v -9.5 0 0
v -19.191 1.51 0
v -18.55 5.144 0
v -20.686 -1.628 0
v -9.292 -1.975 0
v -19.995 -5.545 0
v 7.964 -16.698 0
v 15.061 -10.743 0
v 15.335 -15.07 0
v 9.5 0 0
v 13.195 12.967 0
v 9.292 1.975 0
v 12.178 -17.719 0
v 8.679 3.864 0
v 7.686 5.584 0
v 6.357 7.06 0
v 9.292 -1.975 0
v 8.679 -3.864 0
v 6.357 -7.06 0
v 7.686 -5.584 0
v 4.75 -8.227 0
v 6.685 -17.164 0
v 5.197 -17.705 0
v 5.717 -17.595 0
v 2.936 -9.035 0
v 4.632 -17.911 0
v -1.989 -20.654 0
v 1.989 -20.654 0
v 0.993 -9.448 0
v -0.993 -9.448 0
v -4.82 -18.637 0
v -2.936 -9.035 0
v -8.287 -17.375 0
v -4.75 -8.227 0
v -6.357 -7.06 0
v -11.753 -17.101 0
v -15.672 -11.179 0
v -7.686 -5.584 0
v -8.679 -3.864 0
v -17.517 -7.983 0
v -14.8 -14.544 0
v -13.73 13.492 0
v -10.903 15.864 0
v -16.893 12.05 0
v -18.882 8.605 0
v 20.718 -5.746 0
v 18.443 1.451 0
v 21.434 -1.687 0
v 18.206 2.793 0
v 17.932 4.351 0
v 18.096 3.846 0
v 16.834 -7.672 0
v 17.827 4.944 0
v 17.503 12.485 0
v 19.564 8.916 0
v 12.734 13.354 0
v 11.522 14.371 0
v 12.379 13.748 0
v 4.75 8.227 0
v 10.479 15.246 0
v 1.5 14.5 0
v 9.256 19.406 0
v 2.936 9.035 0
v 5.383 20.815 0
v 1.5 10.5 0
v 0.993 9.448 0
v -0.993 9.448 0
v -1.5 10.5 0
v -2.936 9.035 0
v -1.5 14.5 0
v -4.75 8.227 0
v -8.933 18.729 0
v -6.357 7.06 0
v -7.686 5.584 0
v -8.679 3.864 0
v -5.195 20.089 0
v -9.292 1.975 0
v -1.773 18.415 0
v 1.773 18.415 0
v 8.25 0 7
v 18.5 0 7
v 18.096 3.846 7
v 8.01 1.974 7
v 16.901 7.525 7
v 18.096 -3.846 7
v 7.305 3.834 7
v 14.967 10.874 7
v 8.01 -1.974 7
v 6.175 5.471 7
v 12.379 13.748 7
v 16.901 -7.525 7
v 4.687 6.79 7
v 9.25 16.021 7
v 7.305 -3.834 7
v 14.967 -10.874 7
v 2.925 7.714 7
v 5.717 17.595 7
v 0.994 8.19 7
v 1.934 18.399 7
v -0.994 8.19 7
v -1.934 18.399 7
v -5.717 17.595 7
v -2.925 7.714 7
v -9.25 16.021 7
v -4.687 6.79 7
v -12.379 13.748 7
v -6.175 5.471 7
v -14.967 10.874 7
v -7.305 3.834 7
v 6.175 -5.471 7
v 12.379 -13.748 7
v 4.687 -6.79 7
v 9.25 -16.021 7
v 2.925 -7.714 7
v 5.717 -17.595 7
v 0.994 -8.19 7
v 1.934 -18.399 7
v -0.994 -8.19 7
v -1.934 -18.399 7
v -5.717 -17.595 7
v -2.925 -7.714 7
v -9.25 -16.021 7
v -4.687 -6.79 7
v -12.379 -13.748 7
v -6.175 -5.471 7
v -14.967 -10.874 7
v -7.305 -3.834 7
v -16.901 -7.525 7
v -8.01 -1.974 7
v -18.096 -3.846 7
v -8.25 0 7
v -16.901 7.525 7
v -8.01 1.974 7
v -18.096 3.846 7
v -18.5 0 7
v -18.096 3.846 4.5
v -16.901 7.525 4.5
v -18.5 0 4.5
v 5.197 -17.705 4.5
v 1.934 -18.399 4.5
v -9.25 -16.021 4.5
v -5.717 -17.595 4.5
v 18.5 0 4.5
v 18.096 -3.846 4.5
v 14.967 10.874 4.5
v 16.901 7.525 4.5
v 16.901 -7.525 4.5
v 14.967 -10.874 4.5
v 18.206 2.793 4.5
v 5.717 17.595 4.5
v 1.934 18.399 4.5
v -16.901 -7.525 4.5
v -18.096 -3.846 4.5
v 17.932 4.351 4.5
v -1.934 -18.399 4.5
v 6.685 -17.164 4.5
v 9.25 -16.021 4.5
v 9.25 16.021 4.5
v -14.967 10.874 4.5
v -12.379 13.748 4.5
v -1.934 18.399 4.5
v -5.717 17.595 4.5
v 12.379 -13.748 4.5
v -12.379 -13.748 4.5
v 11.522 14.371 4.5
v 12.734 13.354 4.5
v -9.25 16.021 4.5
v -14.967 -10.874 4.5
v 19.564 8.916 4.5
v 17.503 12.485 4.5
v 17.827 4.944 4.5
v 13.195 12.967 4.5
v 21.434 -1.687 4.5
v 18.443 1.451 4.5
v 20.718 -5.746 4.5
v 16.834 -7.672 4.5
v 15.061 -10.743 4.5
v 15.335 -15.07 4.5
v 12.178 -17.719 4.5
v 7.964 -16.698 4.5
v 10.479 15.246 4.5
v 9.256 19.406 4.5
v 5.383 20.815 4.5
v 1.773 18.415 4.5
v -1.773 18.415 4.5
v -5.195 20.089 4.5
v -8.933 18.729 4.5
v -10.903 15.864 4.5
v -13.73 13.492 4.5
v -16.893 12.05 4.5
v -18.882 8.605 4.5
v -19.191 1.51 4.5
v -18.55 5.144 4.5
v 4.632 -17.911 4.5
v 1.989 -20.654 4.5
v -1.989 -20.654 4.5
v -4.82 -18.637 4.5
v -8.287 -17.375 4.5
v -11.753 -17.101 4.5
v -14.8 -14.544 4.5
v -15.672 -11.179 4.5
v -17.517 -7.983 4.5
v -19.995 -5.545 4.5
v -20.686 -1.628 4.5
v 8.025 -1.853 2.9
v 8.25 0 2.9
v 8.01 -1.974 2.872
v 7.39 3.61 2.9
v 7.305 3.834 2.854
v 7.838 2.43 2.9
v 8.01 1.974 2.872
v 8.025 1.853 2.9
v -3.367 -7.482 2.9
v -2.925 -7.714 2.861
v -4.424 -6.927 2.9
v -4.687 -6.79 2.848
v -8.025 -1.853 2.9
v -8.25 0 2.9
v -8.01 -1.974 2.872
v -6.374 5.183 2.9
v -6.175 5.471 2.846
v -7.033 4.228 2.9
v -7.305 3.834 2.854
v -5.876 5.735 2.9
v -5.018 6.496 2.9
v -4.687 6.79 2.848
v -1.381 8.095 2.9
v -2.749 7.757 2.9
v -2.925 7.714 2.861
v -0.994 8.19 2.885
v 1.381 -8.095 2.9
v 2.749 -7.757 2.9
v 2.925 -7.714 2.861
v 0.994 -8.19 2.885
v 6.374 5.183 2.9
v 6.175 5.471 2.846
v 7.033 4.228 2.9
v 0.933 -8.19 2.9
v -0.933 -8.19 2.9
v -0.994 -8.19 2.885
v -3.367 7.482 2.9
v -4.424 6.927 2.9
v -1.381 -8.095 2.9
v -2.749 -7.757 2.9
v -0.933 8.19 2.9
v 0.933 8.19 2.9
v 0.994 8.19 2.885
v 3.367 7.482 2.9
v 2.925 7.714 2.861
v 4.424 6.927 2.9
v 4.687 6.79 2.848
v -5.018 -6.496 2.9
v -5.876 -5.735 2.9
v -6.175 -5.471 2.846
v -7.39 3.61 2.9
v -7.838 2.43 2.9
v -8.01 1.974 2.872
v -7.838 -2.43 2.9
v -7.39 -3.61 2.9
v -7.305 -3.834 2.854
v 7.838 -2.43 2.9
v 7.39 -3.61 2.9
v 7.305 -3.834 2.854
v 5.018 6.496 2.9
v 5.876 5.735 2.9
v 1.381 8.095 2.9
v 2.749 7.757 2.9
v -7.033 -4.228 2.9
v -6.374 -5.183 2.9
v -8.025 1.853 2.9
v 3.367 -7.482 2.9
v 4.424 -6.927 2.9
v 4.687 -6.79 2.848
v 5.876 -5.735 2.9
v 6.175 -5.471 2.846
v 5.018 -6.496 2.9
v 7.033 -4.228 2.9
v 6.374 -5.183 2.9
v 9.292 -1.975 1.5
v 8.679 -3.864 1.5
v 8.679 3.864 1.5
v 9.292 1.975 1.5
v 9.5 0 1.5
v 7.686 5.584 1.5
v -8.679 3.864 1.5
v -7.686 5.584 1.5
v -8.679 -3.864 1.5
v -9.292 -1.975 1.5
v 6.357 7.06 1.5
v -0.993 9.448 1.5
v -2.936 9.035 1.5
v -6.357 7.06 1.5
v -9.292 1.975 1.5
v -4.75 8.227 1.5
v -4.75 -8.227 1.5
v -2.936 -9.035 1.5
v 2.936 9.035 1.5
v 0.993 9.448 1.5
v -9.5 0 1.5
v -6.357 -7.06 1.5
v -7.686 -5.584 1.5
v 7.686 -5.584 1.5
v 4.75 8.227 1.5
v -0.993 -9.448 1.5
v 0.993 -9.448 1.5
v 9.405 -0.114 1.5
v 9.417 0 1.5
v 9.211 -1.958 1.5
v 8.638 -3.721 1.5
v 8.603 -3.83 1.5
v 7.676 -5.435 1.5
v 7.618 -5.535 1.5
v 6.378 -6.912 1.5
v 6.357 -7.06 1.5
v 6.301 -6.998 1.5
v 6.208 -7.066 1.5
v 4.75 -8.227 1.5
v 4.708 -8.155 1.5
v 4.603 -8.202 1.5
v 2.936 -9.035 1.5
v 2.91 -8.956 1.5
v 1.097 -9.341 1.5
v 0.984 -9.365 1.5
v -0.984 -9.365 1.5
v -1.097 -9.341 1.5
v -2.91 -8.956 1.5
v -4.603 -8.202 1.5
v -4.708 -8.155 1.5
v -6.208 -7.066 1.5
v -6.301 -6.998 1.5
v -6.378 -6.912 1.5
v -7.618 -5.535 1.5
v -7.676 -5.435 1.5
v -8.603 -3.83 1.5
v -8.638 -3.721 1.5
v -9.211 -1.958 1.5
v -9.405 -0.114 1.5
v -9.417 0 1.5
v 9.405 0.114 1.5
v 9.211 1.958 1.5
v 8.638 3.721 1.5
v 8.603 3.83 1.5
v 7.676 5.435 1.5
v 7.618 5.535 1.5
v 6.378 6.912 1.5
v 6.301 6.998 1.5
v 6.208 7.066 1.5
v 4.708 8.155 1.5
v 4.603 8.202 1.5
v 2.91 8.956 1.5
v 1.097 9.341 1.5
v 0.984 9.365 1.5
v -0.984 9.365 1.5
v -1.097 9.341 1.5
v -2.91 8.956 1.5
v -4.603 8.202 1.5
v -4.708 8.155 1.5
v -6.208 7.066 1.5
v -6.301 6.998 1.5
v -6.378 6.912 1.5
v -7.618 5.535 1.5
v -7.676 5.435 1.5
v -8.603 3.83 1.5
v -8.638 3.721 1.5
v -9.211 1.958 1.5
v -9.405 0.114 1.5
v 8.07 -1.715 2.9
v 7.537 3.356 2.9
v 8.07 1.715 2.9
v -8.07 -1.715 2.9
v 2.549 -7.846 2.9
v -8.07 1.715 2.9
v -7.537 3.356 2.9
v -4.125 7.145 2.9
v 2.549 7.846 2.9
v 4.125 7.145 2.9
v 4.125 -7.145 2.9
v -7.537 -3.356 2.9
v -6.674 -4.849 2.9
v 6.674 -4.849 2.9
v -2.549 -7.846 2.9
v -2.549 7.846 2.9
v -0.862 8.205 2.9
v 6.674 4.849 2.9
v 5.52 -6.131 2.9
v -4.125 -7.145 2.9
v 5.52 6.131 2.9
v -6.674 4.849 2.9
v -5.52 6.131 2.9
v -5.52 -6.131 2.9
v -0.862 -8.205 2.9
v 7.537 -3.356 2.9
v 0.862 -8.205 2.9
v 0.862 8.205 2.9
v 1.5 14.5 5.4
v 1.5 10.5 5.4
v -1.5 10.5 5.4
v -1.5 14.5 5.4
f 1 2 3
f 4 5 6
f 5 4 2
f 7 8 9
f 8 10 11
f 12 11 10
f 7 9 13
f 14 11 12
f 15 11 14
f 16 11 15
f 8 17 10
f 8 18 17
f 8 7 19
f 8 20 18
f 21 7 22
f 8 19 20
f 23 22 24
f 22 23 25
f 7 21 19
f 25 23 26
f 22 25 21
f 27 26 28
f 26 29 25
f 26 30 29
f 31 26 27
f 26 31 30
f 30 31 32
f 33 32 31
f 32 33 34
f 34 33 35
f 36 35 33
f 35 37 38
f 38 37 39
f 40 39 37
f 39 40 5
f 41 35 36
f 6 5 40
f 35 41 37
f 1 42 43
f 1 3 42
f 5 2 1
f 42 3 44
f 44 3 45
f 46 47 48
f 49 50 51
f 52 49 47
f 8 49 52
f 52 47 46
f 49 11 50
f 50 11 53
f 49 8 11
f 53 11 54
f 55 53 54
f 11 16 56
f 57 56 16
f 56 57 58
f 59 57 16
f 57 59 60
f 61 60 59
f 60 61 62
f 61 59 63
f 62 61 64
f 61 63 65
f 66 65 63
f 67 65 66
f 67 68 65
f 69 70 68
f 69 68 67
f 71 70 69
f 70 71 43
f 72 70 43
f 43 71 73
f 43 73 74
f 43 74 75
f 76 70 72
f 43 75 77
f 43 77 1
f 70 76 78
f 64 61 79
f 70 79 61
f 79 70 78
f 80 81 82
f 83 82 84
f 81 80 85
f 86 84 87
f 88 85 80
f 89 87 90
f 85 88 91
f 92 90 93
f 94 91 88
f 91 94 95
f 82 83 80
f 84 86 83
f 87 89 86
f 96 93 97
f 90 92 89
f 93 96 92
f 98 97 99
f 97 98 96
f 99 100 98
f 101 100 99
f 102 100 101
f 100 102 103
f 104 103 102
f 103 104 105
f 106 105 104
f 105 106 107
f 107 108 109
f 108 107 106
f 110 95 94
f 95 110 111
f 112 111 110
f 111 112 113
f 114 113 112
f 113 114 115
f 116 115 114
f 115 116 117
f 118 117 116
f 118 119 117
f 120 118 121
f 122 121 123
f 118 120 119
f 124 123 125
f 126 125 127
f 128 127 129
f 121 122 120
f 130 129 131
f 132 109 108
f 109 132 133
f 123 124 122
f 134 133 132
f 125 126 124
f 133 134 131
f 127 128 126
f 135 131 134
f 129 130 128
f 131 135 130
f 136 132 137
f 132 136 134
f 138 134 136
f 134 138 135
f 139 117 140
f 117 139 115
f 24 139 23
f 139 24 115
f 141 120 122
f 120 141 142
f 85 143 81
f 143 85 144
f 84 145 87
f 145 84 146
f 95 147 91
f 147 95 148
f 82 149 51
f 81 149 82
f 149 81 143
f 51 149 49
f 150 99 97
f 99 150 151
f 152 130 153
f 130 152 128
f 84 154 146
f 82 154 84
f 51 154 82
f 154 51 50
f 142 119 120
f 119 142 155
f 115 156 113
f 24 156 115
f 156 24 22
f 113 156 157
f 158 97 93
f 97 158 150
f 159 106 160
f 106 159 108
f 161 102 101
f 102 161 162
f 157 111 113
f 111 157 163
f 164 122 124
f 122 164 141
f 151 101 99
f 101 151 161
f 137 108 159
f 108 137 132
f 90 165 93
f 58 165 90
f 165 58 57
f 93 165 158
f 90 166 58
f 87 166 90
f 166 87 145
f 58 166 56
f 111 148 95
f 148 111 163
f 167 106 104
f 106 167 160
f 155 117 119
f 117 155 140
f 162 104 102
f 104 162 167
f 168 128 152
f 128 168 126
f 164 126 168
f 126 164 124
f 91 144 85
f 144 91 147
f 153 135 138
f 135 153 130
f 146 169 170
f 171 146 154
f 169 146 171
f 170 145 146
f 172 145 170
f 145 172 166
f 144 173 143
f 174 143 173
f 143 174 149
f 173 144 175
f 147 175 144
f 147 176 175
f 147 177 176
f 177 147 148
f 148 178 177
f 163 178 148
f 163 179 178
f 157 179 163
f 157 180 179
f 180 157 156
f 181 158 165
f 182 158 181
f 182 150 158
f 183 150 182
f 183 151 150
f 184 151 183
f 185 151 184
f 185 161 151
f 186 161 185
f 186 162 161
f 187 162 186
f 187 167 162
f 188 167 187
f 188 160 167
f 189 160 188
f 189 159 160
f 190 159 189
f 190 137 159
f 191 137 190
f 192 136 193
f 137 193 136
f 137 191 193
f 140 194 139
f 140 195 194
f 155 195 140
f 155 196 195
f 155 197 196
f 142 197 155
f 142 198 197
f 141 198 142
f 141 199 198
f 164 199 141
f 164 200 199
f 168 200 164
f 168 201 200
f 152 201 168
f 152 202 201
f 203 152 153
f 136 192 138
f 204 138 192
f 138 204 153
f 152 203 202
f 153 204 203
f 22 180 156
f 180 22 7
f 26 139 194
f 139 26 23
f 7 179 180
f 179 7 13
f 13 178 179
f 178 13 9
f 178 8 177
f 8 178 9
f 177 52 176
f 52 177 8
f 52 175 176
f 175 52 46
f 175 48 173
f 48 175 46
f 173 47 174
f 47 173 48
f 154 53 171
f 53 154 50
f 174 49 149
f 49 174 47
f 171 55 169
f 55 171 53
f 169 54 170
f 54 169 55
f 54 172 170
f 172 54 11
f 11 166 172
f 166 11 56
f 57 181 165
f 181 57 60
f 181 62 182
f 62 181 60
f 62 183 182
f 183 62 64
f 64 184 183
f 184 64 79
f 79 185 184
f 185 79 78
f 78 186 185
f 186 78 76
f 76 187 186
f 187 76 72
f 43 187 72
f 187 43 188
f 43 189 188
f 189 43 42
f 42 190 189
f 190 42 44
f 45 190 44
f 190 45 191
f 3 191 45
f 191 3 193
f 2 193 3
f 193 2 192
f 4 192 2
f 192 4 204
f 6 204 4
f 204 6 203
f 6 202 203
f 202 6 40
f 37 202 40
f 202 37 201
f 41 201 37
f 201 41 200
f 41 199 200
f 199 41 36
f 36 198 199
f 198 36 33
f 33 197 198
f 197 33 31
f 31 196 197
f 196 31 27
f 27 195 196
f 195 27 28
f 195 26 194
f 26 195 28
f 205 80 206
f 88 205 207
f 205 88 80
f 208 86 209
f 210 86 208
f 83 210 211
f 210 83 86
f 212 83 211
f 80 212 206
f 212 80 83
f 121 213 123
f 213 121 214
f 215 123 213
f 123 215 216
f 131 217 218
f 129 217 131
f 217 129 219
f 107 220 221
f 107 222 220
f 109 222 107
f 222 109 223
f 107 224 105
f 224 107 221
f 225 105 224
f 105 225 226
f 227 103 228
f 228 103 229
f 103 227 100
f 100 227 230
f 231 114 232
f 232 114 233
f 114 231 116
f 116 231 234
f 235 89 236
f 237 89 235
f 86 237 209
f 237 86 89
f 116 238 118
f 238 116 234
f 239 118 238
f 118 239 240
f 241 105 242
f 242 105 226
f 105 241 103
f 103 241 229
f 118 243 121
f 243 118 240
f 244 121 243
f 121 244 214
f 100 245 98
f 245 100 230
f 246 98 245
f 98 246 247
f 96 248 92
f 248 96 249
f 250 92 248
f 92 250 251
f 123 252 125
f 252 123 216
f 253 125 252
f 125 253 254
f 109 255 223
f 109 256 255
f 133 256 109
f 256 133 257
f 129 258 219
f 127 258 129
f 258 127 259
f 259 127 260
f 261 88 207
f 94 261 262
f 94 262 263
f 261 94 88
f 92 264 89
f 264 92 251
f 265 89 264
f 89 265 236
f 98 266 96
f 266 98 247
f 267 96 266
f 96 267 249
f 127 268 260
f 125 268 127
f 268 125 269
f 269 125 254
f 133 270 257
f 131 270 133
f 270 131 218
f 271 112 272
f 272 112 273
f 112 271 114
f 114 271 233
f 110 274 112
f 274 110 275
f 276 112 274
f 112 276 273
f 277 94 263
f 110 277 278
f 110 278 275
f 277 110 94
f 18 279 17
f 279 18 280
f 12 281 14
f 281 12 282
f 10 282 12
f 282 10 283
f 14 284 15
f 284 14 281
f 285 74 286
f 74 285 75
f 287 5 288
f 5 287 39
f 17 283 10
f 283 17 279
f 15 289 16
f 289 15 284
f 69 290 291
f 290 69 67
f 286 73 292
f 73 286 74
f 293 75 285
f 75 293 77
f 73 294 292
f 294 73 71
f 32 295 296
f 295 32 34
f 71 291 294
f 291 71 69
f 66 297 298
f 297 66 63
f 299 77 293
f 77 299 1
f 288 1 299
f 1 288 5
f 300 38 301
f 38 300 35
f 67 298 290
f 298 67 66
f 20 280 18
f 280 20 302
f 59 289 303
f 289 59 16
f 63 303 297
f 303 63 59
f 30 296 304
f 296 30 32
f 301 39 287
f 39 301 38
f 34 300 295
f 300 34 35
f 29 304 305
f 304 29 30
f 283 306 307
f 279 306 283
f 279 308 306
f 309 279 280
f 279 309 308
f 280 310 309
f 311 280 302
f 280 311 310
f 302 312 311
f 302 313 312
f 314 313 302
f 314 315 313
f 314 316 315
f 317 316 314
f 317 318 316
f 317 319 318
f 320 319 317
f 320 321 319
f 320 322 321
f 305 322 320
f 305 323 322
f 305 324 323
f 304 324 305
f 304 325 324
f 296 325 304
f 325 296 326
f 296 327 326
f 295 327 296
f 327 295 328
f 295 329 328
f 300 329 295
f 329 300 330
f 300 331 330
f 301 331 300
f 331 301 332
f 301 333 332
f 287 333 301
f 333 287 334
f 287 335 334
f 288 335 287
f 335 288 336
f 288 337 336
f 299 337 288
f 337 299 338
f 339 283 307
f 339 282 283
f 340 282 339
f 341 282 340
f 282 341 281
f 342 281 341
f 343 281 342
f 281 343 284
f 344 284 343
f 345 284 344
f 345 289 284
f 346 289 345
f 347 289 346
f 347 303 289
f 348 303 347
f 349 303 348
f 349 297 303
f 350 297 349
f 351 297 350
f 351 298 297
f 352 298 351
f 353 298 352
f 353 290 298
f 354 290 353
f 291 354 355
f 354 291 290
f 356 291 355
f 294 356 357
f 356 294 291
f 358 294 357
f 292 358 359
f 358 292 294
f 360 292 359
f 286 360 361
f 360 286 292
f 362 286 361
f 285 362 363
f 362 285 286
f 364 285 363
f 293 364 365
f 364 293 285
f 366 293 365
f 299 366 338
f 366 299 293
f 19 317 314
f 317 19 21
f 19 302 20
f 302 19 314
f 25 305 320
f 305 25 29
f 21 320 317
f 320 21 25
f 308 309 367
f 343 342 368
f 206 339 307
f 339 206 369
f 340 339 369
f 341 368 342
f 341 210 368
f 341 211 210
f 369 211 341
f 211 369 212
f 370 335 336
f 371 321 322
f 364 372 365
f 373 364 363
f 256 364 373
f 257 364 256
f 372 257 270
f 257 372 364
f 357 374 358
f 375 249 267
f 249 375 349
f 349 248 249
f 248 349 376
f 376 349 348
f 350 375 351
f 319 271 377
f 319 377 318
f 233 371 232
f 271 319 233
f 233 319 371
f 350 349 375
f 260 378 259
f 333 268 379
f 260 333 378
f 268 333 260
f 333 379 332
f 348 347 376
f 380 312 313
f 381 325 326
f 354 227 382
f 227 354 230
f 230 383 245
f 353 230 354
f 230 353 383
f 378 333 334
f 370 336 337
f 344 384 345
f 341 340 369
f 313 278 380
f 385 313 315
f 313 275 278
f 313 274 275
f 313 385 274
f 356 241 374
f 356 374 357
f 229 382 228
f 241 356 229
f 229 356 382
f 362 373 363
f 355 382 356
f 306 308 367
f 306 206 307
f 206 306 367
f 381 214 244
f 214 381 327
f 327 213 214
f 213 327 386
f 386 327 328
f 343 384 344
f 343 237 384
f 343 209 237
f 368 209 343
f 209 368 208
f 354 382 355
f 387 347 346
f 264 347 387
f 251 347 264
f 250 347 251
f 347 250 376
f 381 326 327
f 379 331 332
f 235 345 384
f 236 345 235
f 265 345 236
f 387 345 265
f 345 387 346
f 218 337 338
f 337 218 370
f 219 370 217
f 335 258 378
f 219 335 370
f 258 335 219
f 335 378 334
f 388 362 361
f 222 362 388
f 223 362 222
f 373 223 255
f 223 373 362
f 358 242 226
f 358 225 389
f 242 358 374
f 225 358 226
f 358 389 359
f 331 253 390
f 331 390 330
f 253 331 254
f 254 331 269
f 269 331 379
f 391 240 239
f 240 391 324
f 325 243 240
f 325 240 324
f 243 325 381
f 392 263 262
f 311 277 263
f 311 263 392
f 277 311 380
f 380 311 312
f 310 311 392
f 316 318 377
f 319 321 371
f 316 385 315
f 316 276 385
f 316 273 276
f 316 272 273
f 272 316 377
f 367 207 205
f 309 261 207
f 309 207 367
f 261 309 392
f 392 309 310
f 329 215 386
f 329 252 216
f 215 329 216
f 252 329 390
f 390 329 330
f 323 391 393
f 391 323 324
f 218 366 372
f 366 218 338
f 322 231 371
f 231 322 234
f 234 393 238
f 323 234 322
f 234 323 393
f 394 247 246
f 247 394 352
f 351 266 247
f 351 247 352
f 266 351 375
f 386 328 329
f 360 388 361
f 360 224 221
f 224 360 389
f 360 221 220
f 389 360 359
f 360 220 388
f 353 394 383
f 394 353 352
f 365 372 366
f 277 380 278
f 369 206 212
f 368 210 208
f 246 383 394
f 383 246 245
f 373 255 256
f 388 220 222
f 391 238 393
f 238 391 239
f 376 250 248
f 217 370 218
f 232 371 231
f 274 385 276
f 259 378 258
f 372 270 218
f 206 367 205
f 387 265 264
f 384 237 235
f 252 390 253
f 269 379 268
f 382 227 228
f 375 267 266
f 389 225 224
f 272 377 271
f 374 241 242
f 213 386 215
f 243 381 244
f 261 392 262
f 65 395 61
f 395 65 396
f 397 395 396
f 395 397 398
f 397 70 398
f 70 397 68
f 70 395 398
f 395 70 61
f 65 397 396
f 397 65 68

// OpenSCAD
// file: Cam-as-18-Sided-Polygon.scad
/*  Provides a common method / function / module to 3D Print an 18 sided polygon for a cam used by Elna Supermatic, Elna SU machines sewing machines, matching with the 18 punches made by the needle per each rotation of a cam.

    Copyright (C) 2020  L Komandur

    This program is free software: you can redistribute it and/or modify
    it under the terms of the GNU General Public License as published by
    the Free Software Foundation, either version 3 of the License, or
    (at your option) any later version.

    This program is distributed in the hope that it will be useful,
    but WITHOUT ANY WARRANTY; without even the implied warranty of
    MERCHANTABILITY or FITNESS FOR A PARTICULAR PURPOSE.  See the
    GNU General Public License for more details.

    You should have received a copy of the GNU General Public License
    along with this program.  If not, see <https://www.gnu.org/licenses/>.
*/

thickest_cyl_rad = 17;
skirting_width=1.5;

angle_of_side = 11;
min_radius = thickest_cyl_rad+skirting_width;

module plotpoly(p1,p2,p3,p4,p5,p6,p7,p8,p9,p10,p11,p12,p13,p14,p15,p16,p17,p18) {
	//scale ([-1,1])
	polygon( points = [
	[(min_radius + p1)*sin(0-angle_of_side/2), (min_radius + p1)*cos(0-angle_of_side/2)],
	[(min_radius + p1)*sin(0+angle_of_side/2), (min_radius + p1)*cos(0+angle_of_side/2)],
	[(min_radius + p2)*sin(20-angle_of_side/2), (min_radius + p2)*cos(20-angle_of_side/2)],	
	[(min_radius + p2)*sin(20+angle_of_side/2), (min_radius + p2)*cos(20+angle_of_side/2)],	
	[(min_radius + p3)*sin(40-angle_of_side/2), (min_radius + p3)*cos(40-angle_of_side/2)],	
	[(min_radius + p3)*sin(40+angle_of_side/2), (min_radius + p3)*cos(40+angle_of_side/2)],	
	[(min_radius + p4)*sin(60-angle_of_side/2), (min_radius + p4)*cos(60-angle_of_side/2)],	
	[(min_radius + p4)*sin(60+angle_of_side/2), (min_radius + p4)*cos(60+angle_of_side/2)],	
	[(min_radius + p5)*sin(80-angle_of_side/2), (min_radius + p5)*cos(80-angle_of_side/2)],	
	[(min_radius + p5)*sin(80+angle_of_side/2), (min_radius + p5)*cos(80+angle_of_side/2)],	
	[(min_radius + p6)*sin(100-angle_of_side/2), (min_radius + p6)*cos(100-angle_of_side/2)],	
	[(min_radius + p6)*sin(100+angle_of_side/2), (min_radius + p6)*cos(100+angle_of_side/2)],	
	[(min_radius + p7)*sin(120-angle_of_side/2), (min_radius + p7)*cos(120-angle_of_side/2)],	
	[(min_radius + p7)*sin(120+angle_of_side/2), (min_radius + p7)*cos(120+angle_of_side/2)],	
	[(min_radius + p8)*sin(140-angle_of_side/2), (min_radius + p8)*cos(140-angle_of_side/2)],	
	[(min_radius + p8)*sin(140+angle_of_side/2), (min_radius + p8)*cos(140+angle_of_side/2)],	
	[(min_radius + p9)*sin(160-angle_of_side/2), (min_radius + p9)*cos(160-angle_of_side/2)],	
	[(min_radius + p9)*sin(160+angle_of_side/2), (min_radius + p9)*cos(160+angle_of_side/2)],	
	[(min_radius + p10)*sin(180-angle_of_side/2), (min_radius + p10)*cos(180-angle_of_side/2)],	
	[(min_radius + p10)*sin(180+angle_of_side/2), (min_radius + p10)*cos(180+angle_of_side/2)],	
	[(min_radius + p11)*sin(200-angle_of_side/2), (min_radius + p11)*cos(200-angle_of_side/2)],	
	[(min_radius + p11)*sin(200+angle_of_side/2), (min_radius + p11)*cos(200+angle_of_side/2)],	
	[(min_radius + p12)*sin(220-angle_of_side/2), (min_radius + p12)*cos(220-angle_of_side/2)],	
	[(min_radius + p12)*sin(220+angle_of_side/2), (min_radius + p12)*cos(220+angle_of_side/2)],	
	[(min_radius + p13)*sin(240-angle_of_side/2), (min_radius + p13)*cos(240-angle_of_side/2)],	
	[(min_radius + p13)*sin(240+angle_of_side/2), (min_radius + p13)*cos(240+angle_of_side/2)],	
	[(min_radius + p14)*sin(260-angle_of_side/2), (min_radius + p14)*cos(260-angle_of_side/2)],	
	[(min_radius + p14)*sin(260+angle_of_side/2), (min_radius + p14)*cos(260+angle_of_side/2)],	
	[(min_radius + p15)*sin(280-angle_of_side/2), (min_radius + p15)*cos(280-angle_of_side/2)],	
	[(min_radius + p15)*sin(280+angle_of_side/2), (min_radius + p15)*cos(280+angle_of_side/2)],	
	[(min_radius + p16)*sin(300-angle_of_side/2), (min_radius + p16)*cos(300-angle_of_side/2)],		
	[(min_radius + p16)*sin(300+angle_of_side/2), (min_radius + p16)*cos(300+angle_of_side/2)],		
	[(min_radius + p17)*sin(320-angle_of_side/2), (min_radius + p17)*cos(320-angle_of_side/2)],	
	[(min_radius + p17)*sin(320+angle_of_side/2), (min_radius + p17)*cos(320+angle_of_side/2)],	
	[(min_radius + p18)*sin(340-angle_of_side/2), (min_radius + p18)*cos(340-angle_of_side/2)],
	[(min_radius + p18)*sin(340+angle_of_side/2), (min_radius + p18)*cos(340+angle_of_side/2)]
	]);

}
// main file
/*  3D Prints a "single cam" similar to Cam No 20 of Elna Supermatic, Elna SU machines sewing machines.

    Copyright (C) 2020  L Komandur

    This program is free software: you can redistribute it and/or modify
    it under the terms of the GNU General Public License as published by
    the Free Software Foundation, either version 3 of the License, or
    (at your option) any later version.

    This program is distributed in the hope that it will be useful,
    but WITHOUT ANY WARRANTY; without even the implied warranty of
    MERCHANTABILITY or FITNESS FOR A PARTICULAR PURPOSE.  See the
    GNU General Public License for more details.

    You should have received a copy of the GNU General Public License
    along with this program.  If not, see <https://www.gnu.org/licenses/>.
*/

use <Cam-as-18-Sided-Polygon.scad>

double_disc_thickness = 9;

disc_thickness = 7; // 7 for single, 9 for double
thickest_cyl_rad = 17;

lobe_thickness = 4.5;
inner_hole_rad = 8.25;
hole_bigger_rad = 9.5;
bigger_hole_ht = 1.5;
cut_errors = 0.1;
hole_cone_ht = 1.5;
skirting = 0;


gap_bet_cloth_needle_cams = disc_thickness-2*skirting-2*lobe_thickness;

gap_to_transporthole = 1;

transporthole_width = 3;
transporthole_depth = 5.5;
transporthole_length  = 4;

peak=3;
c=peak/2;
l=0;
r=peak;
cl=peak/4;
cr=peak*3/4;
skirting_width=1.5;
min_radius = thickest_cyl_rad+skirting_width;


module letter(l,font="font.dxf",h=100,i=0) {
	union() {
		linear_extrude( height=h) import(font, layer=l[i]);
		translate([dxf_dim(file=font, name="advx",layer=l[i]),
			dxf_dim(file=font, name="advy",layer=l[i]),
			0])
			child();
	}
}

module word(wrd,font="font.dxf",h=100,i=0) {
	if(i < len(wrd)) {
		letter(wrd,font,h,i) word(wrd,font,h,i+1);
	} else {
		child();
	}
}


module print_s20_cam(x,y) {

	translate([x, y, 0]) rotate(a=[0,0,0]) difference() {
		union() {
			// tall INNER tall cylinder that excludes skirting 
		cylinder(h = disc_thickness, r = thickest_cyl_rad);
	
			// 2nd bigger cylinder shared between 2 cams and skirting; any sewing information would go here.
	
		translate([0, 0, skirting]) cylinder(h = disc_thickness - skirting*2, r = thickest_cyl_rad + skirting_width);
		translate([0, 0, skirting])
		linear_extrude (height  = lobe_thickness)
			plotpoly(l,r,l,r,l,r,l,r,l,cr,cl,cr,cl,cr,cl,cr,cl,cr);
		
	
		}
	
		// Subtract the inner hole. Be very generous.
		translate([0, 0, disc_thickness/2])
			cylinder(h = disc_thickness+1, r = inner_hole_rad, center = true);
	
		// Subtract the lower wider hole
		translate([0, 0, -cut_errors])
			cylinder(h = bigger_hole_ht+cut_errors, r = hole_bigger_rad);
	
	
		// Subtract the cone between wide hole and smaller hole.
		translate([0, 0, bigger_hole_ht-cut_errors])
			cylinder(h = hole_cone_ht, r1 = hole_bigger_rad, r2 = inner_hole_rad);
	
		// Subtract the upper cone the disk locks on the sewing machine post (only for double cams).
		translate([0, 0, double_disc_thickness-skirting-2+cut_errors])
			cylinder(h = 2, r = hole_bigger_rad);
	
		// Initials on the side of transport hole as depressions (top side while printing).
	
		for (letter_depth = [1:6])
		{
			rotate(a=[0, 0, 0]) translate([-2.25, 10.5, disc_thickness-0.1*letter_depth]) scale(0.0015) letter("O");
			rotate(a=[0, 0, 0]) translate([-1.5, 11.25, disc_thickness-0.1*letter_depth]) scale(0.001) letter("O");
			rotate(a=[0, 0, 140]) translate([-8, 10, disc_thickness-0.1*letter_depth]) scale(0.002) letter("E");
			rotate(a=[0, 0, 130]) translate([-4, 11, disc_thickness-0.1*letter_depth]) scale(0.002) letter("L");
			rotate(a=[0, 0, 120]) translate([-0, 11, disc_thickness-0.1*letter_depth]) scale(0.002) letter("N");
			rotate(a=[0, 0, 110]) translate([4, 10, disc_thickness-0.1*letter_depth]) scale(0.002) letter("A");

			rotate(a=[0, 0, 115]) translate([-7, -15, disc_thickness-0.1*letter_depth]) scale(0.002) letter("2");
			rotate(a=[0, 0, 115]) translate([-2, -16, disc_thickness-0.1*letter_depth]) scale(0.002) letter("0");
			rotate(a=[0, 0, 115]) translate([4, -14,disc_thickness-0.1*letter_depth]) scale(0.002) letter(" ");
		}
		// Transport hole made as a rectangular  hole
		difference() {
			rotate(a=[0, 0, 0]) translate([0, hole_bigger_rad + gap_to_transporthole + transporthole_length/2, transporthole_depth/2-cut_errors])
				cube(size = [transporthole_width, transporthole_length, transporthole_depth], center = true);
	
		}
	}
}

print_s20_cam(0,0);
